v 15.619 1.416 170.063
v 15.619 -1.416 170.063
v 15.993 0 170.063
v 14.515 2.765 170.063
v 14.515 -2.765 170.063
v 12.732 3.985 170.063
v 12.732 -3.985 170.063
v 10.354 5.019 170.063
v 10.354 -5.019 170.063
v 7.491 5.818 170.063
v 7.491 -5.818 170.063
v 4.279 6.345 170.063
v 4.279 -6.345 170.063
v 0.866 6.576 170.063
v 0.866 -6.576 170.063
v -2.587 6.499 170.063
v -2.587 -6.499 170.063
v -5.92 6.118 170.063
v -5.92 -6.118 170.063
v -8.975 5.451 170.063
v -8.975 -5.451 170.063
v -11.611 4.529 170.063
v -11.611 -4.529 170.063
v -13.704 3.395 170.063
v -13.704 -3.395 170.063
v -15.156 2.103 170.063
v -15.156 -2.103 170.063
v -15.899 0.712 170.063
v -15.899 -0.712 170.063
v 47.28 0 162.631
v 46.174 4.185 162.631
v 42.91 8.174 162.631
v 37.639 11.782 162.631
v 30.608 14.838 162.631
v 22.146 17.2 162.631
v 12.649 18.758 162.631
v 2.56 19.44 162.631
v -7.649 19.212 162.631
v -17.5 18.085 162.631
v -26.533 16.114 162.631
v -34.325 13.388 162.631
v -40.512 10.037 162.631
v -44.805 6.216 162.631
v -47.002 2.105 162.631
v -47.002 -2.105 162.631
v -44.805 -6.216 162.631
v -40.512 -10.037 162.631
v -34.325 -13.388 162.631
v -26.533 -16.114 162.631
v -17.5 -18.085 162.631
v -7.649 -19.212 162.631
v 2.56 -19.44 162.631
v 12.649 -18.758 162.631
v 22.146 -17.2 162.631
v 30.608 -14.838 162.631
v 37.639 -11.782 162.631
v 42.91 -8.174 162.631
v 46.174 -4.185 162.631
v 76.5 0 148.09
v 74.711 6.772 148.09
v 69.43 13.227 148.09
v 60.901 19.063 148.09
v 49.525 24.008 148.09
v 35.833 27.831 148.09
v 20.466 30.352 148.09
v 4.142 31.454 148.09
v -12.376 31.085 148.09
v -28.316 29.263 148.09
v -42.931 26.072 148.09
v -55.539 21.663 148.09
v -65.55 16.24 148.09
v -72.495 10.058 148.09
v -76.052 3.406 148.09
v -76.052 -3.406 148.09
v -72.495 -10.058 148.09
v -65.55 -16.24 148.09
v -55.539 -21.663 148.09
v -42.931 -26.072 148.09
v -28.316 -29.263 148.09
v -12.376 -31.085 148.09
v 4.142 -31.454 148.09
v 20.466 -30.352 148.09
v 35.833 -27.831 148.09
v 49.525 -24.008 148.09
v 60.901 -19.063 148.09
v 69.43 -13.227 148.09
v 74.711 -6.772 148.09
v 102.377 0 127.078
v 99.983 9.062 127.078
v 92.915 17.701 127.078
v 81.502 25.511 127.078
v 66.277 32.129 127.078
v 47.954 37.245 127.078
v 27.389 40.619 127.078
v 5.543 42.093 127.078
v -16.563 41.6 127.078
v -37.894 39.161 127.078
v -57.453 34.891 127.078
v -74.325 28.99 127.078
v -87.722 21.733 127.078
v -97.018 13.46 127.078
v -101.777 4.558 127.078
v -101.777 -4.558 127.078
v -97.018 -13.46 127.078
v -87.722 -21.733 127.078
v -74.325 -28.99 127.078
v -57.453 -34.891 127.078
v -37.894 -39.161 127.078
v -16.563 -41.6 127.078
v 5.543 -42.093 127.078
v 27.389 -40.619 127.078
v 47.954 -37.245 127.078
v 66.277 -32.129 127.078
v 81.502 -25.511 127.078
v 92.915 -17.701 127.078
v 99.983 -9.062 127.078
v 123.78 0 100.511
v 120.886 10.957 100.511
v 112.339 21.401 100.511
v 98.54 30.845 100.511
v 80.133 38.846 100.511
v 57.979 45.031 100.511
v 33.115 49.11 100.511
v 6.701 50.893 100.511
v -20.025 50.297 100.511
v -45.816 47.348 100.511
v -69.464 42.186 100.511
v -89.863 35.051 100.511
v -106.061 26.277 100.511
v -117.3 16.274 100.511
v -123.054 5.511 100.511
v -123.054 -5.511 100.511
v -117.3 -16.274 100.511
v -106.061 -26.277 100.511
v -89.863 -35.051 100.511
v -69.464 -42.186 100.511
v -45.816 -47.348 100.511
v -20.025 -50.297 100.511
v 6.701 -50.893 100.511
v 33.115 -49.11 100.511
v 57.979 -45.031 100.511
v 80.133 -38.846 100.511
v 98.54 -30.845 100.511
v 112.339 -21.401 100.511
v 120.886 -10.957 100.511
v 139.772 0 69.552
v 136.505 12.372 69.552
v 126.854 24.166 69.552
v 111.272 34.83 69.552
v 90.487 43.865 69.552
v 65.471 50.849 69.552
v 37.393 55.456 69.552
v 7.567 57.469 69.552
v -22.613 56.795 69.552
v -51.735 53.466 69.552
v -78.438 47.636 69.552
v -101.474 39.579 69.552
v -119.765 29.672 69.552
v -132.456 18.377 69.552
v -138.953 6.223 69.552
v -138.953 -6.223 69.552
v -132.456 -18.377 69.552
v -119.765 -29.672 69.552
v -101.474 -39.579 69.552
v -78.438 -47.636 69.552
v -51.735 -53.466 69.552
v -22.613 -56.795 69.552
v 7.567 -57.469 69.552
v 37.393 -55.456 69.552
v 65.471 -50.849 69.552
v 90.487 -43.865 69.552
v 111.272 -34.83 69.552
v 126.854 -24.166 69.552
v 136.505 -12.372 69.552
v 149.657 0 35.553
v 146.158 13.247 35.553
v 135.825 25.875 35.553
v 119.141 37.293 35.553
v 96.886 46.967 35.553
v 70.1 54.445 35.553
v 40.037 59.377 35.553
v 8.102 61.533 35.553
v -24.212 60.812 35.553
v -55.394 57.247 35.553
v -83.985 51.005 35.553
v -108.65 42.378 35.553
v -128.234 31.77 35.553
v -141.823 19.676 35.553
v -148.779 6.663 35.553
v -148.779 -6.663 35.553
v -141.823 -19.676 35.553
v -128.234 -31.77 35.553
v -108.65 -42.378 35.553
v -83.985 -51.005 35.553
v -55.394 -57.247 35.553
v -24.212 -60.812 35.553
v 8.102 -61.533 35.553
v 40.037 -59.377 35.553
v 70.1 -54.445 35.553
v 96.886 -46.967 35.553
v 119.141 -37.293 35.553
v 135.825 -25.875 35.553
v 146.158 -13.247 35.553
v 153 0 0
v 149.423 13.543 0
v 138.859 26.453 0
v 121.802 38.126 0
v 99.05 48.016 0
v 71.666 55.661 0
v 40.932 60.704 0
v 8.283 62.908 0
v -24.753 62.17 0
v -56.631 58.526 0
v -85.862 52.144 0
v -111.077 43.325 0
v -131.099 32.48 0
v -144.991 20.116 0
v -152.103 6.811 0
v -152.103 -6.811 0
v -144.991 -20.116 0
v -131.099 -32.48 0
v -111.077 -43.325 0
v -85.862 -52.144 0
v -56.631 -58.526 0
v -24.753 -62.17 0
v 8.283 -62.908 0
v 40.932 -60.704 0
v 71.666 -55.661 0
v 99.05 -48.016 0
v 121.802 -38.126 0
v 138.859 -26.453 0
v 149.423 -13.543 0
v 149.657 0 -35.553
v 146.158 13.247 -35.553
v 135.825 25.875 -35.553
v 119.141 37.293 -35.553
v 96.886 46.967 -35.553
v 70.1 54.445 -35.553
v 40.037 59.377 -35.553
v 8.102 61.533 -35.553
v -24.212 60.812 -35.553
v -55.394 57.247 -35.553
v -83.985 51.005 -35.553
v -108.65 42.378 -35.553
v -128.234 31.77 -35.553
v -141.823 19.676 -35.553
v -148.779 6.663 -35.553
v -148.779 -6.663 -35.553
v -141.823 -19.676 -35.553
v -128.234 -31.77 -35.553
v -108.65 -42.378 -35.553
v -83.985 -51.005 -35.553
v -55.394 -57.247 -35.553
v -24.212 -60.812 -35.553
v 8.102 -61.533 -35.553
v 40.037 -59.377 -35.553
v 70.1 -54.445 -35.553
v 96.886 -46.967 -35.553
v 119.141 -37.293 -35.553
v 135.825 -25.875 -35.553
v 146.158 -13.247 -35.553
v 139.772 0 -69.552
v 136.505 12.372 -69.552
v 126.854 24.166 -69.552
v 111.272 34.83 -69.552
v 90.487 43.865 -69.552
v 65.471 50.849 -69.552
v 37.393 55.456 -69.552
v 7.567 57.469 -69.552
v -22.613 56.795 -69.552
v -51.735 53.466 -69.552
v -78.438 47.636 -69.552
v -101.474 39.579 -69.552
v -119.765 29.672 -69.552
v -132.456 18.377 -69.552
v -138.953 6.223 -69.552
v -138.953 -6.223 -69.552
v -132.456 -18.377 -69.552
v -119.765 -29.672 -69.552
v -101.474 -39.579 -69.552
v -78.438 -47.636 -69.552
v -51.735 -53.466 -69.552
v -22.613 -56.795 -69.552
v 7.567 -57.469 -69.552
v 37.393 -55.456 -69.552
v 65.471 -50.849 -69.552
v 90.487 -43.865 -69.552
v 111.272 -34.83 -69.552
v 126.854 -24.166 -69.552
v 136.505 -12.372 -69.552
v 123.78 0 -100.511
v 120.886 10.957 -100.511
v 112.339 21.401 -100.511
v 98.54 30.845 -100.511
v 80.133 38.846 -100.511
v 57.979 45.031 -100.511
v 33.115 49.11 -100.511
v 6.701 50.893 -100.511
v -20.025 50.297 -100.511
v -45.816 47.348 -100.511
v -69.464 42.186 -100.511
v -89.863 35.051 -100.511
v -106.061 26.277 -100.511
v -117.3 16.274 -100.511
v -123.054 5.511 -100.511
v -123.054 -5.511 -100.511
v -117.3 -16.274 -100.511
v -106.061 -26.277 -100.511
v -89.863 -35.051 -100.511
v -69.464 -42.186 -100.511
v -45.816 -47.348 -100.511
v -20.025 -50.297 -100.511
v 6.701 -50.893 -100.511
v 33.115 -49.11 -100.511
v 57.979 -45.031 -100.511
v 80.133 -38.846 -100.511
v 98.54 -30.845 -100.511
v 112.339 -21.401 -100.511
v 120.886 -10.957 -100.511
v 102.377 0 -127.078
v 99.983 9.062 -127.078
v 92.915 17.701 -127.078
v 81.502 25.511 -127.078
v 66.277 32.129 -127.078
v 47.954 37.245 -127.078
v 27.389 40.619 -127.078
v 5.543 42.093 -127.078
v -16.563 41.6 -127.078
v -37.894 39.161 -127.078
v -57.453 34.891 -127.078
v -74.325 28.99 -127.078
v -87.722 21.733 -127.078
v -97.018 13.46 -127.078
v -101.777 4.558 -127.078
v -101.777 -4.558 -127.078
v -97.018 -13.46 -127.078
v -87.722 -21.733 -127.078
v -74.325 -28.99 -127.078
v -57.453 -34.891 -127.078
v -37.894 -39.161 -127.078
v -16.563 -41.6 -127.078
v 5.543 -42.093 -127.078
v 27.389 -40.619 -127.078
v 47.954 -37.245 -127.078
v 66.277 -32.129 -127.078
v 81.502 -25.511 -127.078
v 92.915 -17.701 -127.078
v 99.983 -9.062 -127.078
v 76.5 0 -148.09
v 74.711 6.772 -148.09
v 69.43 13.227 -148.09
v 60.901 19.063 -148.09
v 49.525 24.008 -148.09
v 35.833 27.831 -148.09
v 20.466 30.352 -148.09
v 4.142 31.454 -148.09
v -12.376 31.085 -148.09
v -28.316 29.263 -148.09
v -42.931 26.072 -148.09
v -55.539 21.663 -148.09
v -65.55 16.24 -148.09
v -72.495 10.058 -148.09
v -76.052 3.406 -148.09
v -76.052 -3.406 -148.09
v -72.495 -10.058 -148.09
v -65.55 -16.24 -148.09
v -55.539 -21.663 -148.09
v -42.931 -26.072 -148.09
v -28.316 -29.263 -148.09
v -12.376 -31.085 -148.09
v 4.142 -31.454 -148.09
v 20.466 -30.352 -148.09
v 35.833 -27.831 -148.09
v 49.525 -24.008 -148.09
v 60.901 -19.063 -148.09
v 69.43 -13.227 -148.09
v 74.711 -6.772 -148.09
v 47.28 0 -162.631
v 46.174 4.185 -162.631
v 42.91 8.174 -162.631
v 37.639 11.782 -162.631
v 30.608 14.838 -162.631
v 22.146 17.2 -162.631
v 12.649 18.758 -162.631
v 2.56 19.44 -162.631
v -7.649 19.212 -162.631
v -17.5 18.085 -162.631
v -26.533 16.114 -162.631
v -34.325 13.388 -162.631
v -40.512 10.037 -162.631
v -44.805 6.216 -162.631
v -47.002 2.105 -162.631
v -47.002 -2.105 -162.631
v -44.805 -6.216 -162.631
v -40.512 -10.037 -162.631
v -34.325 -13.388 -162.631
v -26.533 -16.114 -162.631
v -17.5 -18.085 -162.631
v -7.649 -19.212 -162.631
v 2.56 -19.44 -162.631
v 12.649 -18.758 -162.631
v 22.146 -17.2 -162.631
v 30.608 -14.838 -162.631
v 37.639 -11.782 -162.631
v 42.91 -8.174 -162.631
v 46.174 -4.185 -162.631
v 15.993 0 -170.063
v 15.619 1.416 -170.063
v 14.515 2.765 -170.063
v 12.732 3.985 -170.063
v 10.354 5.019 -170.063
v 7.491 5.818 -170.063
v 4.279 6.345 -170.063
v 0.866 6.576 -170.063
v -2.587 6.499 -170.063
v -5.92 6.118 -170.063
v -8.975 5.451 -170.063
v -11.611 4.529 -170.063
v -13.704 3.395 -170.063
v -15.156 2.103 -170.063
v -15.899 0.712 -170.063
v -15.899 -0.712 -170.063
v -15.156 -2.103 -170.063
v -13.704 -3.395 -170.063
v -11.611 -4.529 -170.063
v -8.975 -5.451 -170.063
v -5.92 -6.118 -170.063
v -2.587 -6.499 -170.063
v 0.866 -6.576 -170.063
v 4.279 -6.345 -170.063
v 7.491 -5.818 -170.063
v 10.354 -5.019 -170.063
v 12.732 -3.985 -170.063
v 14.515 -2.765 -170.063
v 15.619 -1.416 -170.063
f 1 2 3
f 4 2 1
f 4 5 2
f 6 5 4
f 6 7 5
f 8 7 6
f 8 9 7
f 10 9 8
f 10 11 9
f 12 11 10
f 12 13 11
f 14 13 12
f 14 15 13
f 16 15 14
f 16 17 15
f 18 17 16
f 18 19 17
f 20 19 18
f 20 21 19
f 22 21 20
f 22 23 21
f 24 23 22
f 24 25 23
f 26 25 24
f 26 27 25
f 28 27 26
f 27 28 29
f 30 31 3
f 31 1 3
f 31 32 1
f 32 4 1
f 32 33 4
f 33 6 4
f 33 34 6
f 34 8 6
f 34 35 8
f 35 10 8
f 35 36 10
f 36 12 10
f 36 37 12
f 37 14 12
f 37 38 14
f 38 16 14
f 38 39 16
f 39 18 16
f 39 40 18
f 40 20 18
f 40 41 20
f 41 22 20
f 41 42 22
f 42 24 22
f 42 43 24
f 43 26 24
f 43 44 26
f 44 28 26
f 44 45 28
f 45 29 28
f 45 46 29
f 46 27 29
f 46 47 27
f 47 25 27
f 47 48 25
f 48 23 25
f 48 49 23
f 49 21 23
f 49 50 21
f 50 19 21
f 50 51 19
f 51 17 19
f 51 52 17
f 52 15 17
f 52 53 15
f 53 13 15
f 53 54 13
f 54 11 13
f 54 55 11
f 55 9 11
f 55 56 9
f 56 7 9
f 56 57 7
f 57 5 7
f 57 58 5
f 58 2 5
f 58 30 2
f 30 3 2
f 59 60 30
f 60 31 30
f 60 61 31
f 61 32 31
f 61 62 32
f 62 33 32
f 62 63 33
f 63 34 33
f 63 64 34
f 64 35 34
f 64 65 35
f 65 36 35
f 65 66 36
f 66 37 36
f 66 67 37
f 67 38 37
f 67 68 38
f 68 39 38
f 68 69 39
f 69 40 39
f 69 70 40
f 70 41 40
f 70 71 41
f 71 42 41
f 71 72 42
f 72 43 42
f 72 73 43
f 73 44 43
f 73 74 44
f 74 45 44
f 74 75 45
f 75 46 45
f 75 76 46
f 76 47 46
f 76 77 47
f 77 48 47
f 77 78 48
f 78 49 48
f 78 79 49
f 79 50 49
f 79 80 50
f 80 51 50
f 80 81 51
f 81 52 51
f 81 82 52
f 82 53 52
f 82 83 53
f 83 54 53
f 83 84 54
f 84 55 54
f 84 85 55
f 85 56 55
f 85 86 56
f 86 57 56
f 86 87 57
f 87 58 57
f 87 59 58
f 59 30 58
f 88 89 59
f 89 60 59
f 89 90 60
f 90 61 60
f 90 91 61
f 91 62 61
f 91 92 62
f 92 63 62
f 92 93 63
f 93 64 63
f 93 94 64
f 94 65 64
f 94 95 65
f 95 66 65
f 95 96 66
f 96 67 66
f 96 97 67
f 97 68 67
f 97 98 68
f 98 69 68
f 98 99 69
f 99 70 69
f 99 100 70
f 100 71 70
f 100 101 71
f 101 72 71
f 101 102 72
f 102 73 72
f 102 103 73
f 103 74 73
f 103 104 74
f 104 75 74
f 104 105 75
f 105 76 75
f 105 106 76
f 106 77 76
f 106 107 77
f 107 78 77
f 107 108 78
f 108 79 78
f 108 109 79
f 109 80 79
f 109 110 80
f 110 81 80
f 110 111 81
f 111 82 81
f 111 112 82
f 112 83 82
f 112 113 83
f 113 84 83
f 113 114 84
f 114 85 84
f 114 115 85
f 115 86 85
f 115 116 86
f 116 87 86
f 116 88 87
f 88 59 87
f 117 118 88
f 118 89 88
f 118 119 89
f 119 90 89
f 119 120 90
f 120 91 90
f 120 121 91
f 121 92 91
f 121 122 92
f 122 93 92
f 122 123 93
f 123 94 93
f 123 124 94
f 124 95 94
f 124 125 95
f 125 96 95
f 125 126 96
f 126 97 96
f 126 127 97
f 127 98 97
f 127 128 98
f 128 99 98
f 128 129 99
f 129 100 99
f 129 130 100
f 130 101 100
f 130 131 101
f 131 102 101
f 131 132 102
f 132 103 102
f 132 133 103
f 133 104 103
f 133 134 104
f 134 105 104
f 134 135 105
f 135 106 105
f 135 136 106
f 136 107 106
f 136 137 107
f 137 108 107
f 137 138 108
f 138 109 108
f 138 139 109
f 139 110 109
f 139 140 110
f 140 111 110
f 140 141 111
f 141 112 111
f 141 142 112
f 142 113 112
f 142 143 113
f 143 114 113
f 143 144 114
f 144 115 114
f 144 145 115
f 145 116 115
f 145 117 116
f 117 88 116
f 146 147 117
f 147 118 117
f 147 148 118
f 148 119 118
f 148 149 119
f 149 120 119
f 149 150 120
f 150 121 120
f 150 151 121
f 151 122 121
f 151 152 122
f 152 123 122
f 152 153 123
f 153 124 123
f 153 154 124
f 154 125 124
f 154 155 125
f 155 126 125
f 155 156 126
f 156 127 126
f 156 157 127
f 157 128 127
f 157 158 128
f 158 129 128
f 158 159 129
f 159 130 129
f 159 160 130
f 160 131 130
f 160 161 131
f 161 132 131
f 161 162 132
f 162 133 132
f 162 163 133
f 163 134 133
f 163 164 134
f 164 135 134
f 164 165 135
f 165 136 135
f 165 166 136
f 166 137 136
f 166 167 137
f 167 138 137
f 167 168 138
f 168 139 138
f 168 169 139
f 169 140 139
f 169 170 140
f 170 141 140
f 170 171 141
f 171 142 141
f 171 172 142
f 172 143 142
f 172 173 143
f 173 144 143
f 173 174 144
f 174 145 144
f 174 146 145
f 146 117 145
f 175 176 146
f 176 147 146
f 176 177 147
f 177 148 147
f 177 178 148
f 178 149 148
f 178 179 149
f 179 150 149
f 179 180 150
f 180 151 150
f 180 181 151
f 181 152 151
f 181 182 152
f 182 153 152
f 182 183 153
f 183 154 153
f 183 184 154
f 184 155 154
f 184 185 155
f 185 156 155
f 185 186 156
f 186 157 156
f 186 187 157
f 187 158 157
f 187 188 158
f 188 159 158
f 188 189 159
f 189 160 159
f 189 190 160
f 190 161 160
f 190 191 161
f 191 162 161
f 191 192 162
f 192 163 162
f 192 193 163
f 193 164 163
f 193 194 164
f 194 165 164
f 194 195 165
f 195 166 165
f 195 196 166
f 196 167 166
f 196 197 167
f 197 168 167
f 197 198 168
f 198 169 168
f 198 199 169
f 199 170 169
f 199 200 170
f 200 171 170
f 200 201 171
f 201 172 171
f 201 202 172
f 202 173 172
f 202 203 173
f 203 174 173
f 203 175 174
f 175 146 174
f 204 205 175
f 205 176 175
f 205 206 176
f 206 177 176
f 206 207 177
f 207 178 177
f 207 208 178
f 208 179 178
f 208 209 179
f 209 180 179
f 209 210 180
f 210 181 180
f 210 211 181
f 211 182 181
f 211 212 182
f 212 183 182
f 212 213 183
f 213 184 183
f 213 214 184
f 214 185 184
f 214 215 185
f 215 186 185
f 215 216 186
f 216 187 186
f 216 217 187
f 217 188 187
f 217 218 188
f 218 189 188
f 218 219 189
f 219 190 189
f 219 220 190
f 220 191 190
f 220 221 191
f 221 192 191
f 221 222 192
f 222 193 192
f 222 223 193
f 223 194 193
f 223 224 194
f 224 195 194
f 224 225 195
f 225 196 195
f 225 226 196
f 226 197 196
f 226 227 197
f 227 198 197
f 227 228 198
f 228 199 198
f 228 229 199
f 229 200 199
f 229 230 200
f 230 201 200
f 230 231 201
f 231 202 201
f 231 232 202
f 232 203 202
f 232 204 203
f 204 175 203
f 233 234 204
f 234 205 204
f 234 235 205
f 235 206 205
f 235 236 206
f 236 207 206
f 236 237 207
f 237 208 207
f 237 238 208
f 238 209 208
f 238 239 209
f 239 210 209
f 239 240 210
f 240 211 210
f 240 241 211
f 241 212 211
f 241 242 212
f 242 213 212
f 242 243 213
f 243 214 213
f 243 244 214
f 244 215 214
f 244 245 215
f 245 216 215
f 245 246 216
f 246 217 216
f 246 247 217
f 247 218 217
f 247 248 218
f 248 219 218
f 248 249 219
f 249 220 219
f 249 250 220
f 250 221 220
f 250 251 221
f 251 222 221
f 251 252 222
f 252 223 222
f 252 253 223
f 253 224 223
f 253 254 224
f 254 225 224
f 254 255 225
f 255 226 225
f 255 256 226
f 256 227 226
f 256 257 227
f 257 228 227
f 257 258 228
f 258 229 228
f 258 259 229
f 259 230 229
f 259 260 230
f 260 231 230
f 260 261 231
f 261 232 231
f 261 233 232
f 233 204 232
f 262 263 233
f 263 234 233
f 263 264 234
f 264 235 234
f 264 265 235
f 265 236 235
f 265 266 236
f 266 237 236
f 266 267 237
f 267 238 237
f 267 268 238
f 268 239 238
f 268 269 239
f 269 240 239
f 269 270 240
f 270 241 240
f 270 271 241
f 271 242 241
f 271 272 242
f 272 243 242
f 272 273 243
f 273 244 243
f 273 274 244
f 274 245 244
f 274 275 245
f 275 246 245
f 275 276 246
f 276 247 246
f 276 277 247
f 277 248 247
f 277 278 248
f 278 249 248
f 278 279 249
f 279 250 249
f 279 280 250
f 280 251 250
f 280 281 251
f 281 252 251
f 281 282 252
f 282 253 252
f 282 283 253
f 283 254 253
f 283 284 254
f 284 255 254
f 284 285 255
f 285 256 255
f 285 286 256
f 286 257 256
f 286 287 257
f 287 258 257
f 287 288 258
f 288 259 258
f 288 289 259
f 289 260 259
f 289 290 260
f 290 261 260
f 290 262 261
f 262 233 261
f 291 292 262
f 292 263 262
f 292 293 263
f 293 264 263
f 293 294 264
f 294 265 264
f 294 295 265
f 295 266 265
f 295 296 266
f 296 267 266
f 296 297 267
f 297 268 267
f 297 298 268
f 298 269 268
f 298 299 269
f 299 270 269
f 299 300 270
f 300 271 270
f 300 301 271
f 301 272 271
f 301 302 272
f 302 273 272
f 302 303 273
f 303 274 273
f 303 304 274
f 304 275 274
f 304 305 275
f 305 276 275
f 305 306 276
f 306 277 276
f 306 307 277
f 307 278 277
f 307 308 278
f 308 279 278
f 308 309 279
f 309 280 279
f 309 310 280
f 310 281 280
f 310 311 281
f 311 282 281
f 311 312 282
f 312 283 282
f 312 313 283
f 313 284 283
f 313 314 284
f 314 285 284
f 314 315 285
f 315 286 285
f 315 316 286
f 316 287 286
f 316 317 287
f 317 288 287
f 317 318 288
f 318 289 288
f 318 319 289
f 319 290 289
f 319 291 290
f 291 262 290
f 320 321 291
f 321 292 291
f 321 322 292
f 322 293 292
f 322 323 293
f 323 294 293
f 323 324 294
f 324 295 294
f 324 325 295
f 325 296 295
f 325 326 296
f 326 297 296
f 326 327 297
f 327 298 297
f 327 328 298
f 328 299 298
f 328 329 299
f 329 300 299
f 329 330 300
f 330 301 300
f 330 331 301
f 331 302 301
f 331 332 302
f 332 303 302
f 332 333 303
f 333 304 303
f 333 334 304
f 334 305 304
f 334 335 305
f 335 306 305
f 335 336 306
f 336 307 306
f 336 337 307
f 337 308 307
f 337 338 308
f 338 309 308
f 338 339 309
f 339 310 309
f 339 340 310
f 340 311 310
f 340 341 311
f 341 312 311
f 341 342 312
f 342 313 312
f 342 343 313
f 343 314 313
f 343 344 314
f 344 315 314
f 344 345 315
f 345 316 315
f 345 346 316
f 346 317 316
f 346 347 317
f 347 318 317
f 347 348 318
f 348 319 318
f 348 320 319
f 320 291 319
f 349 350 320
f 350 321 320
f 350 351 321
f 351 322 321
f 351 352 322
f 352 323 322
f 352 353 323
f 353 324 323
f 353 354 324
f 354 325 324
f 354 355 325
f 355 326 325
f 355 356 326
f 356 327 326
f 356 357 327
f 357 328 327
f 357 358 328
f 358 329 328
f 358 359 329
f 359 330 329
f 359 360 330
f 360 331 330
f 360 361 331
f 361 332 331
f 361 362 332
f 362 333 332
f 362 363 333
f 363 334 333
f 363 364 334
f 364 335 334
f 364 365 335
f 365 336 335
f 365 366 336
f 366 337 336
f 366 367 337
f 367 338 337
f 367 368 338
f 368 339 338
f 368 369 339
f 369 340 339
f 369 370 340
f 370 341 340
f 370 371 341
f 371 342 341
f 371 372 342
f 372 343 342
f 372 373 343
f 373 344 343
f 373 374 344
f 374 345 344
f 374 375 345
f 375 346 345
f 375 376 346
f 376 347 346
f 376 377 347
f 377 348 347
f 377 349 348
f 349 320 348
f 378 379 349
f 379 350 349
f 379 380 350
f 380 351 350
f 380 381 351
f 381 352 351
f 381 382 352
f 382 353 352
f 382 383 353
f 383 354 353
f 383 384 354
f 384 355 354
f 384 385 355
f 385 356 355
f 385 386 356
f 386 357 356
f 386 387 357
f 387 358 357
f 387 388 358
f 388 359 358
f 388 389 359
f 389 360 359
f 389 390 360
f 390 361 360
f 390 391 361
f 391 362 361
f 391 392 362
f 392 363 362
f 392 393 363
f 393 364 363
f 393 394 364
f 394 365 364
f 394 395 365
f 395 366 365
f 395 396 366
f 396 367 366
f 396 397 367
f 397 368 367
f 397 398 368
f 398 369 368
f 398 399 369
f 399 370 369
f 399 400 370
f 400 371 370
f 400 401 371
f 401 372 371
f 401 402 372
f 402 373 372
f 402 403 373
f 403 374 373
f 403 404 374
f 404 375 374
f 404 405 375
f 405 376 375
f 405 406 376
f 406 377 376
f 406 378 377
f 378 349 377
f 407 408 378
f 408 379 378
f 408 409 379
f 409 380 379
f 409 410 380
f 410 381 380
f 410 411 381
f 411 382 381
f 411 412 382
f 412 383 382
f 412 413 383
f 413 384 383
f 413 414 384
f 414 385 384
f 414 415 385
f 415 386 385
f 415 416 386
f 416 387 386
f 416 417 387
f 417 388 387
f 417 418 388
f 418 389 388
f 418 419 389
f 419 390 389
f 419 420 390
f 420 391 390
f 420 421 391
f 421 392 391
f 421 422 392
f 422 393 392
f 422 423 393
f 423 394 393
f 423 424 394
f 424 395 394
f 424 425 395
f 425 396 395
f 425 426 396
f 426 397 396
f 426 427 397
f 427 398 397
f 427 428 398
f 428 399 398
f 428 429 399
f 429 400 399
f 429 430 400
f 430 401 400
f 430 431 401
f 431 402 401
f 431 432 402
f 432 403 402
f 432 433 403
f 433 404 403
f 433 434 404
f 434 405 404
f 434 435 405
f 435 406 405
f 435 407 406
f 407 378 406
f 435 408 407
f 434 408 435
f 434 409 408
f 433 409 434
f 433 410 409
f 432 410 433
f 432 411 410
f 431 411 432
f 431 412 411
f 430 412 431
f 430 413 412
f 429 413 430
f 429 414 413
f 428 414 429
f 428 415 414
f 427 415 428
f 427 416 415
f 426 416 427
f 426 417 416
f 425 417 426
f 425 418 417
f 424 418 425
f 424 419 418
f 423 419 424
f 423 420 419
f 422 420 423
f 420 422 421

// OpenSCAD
// Generated by SolidPython 1.0.1 on 2020-07-29 00:46:52


scale(v = [17, 7, 19]) {
	sphere(r = 9);
}
/***********************************************
*********      SolidPython code:      **********
************************************************
 
# import packages: SolidPython
from solid import *
from solid.utils import *
from itertools import chain, combinations, permutations


class Resize:

    def __init__(self, scad_file):
        self.scad_file = scad_file
        #self.scad_file = import_scad(scad_file)
        # cone/cylinder param:
        self.r1 = 0
        self.r2 = 0
        self.h = 0
        # rectangular prism param:
        self.w = 0
        self.l = 0
        # ellipse param:
        self.r = 0

    # import OpenScad code (file name corresponds to shape)


    # classify shape + parameters
    def assign(self, param1, param2, param3):
        if self.scad_file == 'cone.scad':
            self.r1 = param1
            self.r2 = param2
            self.h = param3
        elif self.scad_file == 'cylinder.scad':
            self.r1 = param1
            self.r2 = param2
            self.h = param3
        elif self.scad_file == 'rectangularPrism.scad':
            self.h = param1
            self.l = param2
            self.w = param3
        else:
            self.r = param1
            self.h = param2

    # resize parameters
    def iterate(self):
        x = range(3, 20, 2)
        i = 1
        if self.scad_file == 'cone.scad':
            tempList = list(permutations(x, 2))
            for temp in tempList:
                param1 = temp[0]
                param2 = temp[1]
                filepath = 'produced_scad_files/' + 'cone' + str(param1) + '_' + str(param2) + '_' + '.scad'
                scad_render_to_file(cylinder(h=param1, r1=param2, r2=0), filepath)

        elif self.scad_file == 'cylinder.scad':
            tempList = list(permutations(x, 3))
            for temp in tempList:
                param1 = temp[0]
                param2 = temp[1]
                filepath = 'produced_scad_files/' + 'cylinder' + str(param1) + '_' + str(param2) + '_' + '.scad'
                scad_render_to_file(cylinder(h=param1, r1=param2, r2=param2), filepath)

        elif self.scad_file == 'rectangularPrism.scad':
            tempList = list(permutations(x, 3))
            for temp in tempList:
                param1 = temp[0]
                param2 = temp[1]
                param3 = temp[2]
                filepath = 'produced_scad_files/' + 'rectangularPrism' + str(param1) + '_' + str(param2) + '_' + str(
                    param3) + '.scad'
                scad_render_to_file(cube(size=(param1, param2, param3)), filepath)

        elif self.scad_file == 'ellipse.scad':
            tempList = list(permutations(x, 4))
            for temp in tempList:
                param1 = temp[0]
                param2 = temp[1]
                param3 = temp[2]
                param4 = temp[3]
                filepath = 'produced_scad_files/' + 'ellipse' + str(param1) + '_' + str(param2) + '_' + str(param3) + '_' + str(param4) + '.scad'
                scad_render_to_file(scale([param1, param2, param3])(sphere(r=param4)), filepath)

    def render_to_scadfile(self):
        scad_render_to_file(scad, 'example.scad') 
 
************************************************/
